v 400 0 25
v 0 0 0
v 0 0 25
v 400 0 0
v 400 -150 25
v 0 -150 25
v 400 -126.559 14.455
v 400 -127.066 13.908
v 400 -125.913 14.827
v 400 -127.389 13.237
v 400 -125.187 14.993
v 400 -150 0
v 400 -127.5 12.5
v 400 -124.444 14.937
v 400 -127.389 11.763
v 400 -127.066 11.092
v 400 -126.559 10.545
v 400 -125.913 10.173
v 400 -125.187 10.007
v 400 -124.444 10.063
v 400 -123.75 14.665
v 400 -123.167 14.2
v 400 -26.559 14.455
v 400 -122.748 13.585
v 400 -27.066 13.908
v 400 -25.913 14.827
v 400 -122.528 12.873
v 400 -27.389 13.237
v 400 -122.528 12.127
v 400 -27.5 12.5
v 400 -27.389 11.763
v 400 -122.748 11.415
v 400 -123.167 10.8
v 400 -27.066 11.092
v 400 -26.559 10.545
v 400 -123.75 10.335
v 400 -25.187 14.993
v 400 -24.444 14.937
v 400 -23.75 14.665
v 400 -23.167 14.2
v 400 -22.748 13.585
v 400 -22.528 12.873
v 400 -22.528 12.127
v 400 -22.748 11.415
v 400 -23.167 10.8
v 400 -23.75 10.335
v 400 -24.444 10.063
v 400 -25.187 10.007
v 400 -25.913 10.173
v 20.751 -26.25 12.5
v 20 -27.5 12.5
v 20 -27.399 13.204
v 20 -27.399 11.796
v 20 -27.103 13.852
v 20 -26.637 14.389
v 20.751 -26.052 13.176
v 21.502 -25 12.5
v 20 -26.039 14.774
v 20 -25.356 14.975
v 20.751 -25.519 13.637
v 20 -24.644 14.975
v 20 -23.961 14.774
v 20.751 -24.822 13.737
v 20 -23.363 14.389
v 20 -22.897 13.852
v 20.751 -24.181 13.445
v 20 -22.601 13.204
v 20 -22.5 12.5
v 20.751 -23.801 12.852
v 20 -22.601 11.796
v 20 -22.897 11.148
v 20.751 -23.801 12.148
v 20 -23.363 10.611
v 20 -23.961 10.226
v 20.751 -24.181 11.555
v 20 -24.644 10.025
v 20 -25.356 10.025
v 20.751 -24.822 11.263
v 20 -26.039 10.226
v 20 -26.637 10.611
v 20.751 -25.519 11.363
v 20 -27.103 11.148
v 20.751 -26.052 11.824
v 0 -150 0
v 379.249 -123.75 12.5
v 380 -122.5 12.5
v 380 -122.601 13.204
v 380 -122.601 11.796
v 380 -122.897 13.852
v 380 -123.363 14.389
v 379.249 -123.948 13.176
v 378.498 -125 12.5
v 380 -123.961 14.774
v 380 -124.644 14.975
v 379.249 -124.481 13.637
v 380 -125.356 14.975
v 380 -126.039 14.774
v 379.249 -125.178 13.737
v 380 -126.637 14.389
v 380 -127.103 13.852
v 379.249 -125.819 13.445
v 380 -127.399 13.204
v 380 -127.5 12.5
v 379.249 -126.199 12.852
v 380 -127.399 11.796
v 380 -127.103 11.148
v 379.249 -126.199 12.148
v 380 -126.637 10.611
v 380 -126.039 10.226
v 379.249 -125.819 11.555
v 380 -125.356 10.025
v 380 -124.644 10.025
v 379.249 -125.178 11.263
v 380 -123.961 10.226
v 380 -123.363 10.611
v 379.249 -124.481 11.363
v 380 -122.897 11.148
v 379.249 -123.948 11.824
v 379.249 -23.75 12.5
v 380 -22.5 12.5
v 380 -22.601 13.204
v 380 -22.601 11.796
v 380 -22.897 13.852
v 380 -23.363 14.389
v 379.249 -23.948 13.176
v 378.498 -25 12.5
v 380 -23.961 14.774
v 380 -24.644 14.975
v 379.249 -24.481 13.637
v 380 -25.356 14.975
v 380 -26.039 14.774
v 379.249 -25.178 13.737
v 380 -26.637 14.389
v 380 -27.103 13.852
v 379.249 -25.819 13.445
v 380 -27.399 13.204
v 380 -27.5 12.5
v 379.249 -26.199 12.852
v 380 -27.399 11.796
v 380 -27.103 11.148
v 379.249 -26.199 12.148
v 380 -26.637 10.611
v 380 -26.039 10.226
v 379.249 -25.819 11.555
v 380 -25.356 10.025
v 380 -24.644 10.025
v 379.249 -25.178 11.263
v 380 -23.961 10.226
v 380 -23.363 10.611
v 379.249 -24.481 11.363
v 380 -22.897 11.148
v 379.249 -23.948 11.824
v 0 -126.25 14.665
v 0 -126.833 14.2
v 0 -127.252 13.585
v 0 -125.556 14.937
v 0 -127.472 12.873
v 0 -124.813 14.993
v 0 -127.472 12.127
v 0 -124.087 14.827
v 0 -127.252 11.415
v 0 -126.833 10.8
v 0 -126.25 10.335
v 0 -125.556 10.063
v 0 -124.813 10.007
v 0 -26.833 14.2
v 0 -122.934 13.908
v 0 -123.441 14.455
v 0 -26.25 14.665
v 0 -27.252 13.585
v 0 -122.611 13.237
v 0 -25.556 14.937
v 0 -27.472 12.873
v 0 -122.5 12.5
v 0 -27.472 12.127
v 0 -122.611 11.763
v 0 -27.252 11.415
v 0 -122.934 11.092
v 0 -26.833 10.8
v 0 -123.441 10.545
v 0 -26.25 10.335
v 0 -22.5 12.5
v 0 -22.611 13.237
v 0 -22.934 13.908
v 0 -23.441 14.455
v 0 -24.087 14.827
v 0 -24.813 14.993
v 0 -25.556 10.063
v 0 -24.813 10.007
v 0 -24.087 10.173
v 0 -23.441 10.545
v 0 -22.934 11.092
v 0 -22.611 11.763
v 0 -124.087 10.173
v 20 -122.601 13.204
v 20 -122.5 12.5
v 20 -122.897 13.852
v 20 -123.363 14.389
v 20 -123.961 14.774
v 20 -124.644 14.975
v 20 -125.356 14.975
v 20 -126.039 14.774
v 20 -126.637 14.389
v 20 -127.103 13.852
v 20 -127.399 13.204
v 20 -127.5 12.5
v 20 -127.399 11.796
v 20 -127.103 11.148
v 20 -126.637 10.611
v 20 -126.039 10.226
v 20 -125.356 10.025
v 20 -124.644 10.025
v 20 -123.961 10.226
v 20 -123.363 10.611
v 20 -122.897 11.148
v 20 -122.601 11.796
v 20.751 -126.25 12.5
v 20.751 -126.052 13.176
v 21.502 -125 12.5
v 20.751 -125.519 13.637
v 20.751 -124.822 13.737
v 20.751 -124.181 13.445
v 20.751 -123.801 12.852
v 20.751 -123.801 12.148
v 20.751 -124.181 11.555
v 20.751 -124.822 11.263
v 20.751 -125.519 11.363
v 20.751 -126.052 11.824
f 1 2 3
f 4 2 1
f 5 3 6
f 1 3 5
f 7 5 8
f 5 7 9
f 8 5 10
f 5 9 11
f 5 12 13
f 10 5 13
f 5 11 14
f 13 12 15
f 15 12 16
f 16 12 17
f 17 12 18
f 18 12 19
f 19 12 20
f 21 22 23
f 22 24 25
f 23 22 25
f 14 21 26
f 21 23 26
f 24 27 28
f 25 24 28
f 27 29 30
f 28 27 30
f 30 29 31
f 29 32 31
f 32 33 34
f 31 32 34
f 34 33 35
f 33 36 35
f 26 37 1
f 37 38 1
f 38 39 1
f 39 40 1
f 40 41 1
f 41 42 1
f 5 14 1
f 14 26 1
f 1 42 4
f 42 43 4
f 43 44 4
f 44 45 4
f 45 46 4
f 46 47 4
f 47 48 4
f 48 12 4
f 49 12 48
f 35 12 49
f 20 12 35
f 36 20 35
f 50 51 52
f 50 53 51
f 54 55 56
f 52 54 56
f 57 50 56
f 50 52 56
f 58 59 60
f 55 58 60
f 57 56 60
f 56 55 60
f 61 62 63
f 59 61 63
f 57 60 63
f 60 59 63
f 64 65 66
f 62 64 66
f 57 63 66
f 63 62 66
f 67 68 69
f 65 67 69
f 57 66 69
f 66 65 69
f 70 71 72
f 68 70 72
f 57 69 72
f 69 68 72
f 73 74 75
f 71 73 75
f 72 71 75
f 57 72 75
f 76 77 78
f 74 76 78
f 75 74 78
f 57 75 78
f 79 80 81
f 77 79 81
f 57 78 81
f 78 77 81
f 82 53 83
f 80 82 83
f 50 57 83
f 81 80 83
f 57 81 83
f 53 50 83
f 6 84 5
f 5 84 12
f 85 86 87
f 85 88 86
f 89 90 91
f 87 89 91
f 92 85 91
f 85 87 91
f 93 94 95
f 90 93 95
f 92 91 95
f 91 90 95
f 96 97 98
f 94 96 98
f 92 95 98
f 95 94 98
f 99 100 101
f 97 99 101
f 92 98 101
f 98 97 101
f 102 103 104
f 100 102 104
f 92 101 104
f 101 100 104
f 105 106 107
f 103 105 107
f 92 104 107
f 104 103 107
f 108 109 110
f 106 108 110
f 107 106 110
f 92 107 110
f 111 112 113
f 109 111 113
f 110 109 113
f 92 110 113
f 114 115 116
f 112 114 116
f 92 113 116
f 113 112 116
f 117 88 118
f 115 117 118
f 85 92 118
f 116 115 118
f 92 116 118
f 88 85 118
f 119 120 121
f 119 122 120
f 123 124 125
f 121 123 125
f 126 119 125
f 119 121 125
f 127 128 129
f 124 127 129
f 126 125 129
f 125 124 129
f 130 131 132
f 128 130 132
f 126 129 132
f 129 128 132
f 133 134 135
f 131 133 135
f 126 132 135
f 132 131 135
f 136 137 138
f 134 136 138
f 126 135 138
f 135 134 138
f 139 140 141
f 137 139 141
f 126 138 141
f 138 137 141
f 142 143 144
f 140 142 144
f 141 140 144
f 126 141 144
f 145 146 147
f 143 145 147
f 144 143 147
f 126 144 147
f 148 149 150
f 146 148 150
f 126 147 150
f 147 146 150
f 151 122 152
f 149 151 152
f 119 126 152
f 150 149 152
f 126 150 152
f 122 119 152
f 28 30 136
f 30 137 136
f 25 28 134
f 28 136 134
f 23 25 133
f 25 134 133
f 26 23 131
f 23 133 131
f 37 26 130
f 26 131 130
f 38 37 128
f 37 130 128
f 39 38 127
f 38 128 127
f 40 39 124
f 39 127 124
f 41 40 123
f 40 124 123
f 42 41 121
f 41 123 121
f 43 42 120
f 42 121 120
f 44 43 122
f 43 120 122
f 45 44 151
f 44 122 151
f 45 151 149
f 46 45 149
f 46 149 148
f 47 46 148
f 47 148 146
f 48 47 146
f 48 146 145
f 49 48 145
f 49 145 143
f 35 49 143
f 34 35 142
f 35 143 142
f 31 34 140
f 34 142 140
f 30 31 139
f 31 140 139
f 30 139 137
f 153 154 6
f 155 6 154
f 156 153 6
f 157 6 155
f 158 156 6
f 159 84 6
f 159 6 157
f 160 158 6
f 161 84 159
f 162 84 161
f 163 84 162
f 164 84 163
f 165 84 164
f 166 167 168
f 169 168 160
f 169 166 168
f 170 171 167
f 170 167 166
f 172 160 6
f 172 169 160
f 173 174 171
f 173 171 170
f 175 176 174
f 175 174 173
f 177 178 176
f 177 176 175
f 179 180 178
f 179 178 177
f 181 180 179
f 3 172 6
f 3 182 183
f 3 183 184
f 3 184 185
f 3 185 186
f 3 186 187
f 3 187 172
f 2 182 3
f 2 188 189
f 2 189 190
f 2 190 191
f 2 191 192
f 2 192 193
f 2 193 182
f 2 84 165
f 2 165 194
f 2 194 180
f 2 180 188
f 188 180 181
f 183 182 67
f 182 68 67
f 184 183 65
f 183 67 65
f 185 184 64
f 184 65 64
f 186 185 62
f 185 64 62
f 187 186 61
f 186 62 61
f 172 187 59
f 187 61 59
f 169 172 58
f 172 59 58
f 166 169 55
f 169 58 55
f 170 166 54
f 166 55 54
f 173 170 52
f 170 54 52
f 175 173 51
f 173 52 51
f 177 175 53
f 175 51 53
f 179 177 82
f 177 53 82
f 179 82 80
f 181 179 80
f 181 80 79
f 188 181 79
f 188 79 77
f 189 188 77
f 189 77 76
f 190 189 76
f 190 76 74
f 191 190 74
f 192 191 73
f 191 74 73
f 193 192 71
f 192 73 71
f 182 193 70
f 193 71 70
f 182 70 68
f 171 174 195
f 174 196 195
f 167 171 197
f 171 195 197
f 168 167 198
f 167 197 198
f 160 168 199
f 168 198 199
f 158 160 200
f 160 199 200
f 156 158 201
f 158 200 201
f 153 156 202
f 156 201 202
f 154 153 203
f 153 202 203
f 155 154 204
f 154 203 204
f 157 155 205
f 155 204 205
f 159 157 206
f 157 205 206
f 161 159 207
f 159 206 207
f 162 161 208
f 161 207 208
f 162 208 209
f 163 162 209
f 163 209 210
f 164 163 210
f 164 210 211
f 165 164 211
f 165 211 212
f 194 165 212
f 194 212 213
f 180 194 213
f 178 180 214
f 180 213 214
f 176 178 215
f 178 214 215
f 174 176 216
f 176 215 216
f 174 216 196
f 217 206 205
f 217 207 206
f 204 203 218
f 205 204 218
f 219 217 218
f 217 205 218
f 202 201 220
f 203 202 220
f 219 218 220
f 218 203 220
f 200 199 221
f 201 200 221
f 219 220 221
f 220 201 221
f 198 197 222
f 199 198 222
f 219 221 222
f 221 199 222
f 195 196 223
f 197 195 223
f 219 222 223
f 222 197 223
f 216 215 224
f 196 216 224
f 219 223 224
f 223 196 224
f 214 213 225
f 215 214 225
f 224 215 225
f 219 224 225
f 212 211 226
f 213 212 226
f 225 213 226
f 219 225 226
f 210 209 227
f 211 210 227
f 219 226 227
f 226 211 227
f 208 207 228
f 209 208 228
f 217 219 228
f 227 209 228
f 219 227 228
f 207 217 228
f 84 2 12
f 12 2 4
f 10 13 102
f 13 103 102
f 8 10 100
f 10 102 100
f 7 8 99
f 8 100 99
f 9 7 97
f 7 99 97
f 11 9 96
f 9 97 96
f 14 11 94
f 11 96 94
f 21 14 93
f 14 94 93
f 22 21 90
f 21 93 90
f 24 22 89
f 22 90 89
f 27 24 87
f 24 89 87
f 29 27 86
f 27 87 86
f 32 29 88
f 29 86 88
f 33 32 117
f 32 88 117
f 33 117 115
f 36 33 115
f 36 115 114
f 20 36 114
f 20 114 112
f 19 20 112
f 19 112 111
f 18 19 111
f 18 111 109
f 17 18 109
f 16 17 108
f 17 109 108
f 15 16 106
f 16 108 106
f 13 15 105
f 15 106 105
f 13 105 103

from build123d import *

# Parameters (mm, degrees)
F0_W     = 400
F0_H     = 150
F1_DEPTH = 25
F3_D     = 5
F3_DEPTH = 20
F3_TIP   = 1.5021515476
F5_D     = 5
F5_DEPTH = 20
F5_TIP   = 1.5021515476


with BuildPart() as f1:
    # F0 (on Top) → F1 (new body)
    with BuildSketch(Plane.XY):
        with Locations((200, -75)):
            Rectangle(F0_W, F0_H)
    extrude(amount=F1_DEPTH)

    # F3
    with Locations(Plane(origin=(0, 0, 0), x_dir=(0, -1, 0), z_dir=(-1, 0, 0))):
        with Locations((25, 12.5), (125, 12.5)):
            Hole(F3_D / 2, depth=F3_DEPTH)
            with Locations((0, 0, -(F3_DEPTH + F3_TIP / 2))):  # 118° drill point
                Cone(0, F3_D / 2, F3_TIP, mode=Mode.SUBTRACT)

    # F5
    with Locations(Plane.YZ.offset(400)):
        with Locations((-125, 12.5), (-25, 12.5)):
            Hole(F5_D / 2, depth=F5_DEPTH)
            with Locations((0, 0, -(F5_DEPTH + F5_TIP / 2))):  # 118° drill point
                Cone(0, F5_D / 2, F5_TIP, mode=Mode.SUBTRACT)


solid = f1.part
